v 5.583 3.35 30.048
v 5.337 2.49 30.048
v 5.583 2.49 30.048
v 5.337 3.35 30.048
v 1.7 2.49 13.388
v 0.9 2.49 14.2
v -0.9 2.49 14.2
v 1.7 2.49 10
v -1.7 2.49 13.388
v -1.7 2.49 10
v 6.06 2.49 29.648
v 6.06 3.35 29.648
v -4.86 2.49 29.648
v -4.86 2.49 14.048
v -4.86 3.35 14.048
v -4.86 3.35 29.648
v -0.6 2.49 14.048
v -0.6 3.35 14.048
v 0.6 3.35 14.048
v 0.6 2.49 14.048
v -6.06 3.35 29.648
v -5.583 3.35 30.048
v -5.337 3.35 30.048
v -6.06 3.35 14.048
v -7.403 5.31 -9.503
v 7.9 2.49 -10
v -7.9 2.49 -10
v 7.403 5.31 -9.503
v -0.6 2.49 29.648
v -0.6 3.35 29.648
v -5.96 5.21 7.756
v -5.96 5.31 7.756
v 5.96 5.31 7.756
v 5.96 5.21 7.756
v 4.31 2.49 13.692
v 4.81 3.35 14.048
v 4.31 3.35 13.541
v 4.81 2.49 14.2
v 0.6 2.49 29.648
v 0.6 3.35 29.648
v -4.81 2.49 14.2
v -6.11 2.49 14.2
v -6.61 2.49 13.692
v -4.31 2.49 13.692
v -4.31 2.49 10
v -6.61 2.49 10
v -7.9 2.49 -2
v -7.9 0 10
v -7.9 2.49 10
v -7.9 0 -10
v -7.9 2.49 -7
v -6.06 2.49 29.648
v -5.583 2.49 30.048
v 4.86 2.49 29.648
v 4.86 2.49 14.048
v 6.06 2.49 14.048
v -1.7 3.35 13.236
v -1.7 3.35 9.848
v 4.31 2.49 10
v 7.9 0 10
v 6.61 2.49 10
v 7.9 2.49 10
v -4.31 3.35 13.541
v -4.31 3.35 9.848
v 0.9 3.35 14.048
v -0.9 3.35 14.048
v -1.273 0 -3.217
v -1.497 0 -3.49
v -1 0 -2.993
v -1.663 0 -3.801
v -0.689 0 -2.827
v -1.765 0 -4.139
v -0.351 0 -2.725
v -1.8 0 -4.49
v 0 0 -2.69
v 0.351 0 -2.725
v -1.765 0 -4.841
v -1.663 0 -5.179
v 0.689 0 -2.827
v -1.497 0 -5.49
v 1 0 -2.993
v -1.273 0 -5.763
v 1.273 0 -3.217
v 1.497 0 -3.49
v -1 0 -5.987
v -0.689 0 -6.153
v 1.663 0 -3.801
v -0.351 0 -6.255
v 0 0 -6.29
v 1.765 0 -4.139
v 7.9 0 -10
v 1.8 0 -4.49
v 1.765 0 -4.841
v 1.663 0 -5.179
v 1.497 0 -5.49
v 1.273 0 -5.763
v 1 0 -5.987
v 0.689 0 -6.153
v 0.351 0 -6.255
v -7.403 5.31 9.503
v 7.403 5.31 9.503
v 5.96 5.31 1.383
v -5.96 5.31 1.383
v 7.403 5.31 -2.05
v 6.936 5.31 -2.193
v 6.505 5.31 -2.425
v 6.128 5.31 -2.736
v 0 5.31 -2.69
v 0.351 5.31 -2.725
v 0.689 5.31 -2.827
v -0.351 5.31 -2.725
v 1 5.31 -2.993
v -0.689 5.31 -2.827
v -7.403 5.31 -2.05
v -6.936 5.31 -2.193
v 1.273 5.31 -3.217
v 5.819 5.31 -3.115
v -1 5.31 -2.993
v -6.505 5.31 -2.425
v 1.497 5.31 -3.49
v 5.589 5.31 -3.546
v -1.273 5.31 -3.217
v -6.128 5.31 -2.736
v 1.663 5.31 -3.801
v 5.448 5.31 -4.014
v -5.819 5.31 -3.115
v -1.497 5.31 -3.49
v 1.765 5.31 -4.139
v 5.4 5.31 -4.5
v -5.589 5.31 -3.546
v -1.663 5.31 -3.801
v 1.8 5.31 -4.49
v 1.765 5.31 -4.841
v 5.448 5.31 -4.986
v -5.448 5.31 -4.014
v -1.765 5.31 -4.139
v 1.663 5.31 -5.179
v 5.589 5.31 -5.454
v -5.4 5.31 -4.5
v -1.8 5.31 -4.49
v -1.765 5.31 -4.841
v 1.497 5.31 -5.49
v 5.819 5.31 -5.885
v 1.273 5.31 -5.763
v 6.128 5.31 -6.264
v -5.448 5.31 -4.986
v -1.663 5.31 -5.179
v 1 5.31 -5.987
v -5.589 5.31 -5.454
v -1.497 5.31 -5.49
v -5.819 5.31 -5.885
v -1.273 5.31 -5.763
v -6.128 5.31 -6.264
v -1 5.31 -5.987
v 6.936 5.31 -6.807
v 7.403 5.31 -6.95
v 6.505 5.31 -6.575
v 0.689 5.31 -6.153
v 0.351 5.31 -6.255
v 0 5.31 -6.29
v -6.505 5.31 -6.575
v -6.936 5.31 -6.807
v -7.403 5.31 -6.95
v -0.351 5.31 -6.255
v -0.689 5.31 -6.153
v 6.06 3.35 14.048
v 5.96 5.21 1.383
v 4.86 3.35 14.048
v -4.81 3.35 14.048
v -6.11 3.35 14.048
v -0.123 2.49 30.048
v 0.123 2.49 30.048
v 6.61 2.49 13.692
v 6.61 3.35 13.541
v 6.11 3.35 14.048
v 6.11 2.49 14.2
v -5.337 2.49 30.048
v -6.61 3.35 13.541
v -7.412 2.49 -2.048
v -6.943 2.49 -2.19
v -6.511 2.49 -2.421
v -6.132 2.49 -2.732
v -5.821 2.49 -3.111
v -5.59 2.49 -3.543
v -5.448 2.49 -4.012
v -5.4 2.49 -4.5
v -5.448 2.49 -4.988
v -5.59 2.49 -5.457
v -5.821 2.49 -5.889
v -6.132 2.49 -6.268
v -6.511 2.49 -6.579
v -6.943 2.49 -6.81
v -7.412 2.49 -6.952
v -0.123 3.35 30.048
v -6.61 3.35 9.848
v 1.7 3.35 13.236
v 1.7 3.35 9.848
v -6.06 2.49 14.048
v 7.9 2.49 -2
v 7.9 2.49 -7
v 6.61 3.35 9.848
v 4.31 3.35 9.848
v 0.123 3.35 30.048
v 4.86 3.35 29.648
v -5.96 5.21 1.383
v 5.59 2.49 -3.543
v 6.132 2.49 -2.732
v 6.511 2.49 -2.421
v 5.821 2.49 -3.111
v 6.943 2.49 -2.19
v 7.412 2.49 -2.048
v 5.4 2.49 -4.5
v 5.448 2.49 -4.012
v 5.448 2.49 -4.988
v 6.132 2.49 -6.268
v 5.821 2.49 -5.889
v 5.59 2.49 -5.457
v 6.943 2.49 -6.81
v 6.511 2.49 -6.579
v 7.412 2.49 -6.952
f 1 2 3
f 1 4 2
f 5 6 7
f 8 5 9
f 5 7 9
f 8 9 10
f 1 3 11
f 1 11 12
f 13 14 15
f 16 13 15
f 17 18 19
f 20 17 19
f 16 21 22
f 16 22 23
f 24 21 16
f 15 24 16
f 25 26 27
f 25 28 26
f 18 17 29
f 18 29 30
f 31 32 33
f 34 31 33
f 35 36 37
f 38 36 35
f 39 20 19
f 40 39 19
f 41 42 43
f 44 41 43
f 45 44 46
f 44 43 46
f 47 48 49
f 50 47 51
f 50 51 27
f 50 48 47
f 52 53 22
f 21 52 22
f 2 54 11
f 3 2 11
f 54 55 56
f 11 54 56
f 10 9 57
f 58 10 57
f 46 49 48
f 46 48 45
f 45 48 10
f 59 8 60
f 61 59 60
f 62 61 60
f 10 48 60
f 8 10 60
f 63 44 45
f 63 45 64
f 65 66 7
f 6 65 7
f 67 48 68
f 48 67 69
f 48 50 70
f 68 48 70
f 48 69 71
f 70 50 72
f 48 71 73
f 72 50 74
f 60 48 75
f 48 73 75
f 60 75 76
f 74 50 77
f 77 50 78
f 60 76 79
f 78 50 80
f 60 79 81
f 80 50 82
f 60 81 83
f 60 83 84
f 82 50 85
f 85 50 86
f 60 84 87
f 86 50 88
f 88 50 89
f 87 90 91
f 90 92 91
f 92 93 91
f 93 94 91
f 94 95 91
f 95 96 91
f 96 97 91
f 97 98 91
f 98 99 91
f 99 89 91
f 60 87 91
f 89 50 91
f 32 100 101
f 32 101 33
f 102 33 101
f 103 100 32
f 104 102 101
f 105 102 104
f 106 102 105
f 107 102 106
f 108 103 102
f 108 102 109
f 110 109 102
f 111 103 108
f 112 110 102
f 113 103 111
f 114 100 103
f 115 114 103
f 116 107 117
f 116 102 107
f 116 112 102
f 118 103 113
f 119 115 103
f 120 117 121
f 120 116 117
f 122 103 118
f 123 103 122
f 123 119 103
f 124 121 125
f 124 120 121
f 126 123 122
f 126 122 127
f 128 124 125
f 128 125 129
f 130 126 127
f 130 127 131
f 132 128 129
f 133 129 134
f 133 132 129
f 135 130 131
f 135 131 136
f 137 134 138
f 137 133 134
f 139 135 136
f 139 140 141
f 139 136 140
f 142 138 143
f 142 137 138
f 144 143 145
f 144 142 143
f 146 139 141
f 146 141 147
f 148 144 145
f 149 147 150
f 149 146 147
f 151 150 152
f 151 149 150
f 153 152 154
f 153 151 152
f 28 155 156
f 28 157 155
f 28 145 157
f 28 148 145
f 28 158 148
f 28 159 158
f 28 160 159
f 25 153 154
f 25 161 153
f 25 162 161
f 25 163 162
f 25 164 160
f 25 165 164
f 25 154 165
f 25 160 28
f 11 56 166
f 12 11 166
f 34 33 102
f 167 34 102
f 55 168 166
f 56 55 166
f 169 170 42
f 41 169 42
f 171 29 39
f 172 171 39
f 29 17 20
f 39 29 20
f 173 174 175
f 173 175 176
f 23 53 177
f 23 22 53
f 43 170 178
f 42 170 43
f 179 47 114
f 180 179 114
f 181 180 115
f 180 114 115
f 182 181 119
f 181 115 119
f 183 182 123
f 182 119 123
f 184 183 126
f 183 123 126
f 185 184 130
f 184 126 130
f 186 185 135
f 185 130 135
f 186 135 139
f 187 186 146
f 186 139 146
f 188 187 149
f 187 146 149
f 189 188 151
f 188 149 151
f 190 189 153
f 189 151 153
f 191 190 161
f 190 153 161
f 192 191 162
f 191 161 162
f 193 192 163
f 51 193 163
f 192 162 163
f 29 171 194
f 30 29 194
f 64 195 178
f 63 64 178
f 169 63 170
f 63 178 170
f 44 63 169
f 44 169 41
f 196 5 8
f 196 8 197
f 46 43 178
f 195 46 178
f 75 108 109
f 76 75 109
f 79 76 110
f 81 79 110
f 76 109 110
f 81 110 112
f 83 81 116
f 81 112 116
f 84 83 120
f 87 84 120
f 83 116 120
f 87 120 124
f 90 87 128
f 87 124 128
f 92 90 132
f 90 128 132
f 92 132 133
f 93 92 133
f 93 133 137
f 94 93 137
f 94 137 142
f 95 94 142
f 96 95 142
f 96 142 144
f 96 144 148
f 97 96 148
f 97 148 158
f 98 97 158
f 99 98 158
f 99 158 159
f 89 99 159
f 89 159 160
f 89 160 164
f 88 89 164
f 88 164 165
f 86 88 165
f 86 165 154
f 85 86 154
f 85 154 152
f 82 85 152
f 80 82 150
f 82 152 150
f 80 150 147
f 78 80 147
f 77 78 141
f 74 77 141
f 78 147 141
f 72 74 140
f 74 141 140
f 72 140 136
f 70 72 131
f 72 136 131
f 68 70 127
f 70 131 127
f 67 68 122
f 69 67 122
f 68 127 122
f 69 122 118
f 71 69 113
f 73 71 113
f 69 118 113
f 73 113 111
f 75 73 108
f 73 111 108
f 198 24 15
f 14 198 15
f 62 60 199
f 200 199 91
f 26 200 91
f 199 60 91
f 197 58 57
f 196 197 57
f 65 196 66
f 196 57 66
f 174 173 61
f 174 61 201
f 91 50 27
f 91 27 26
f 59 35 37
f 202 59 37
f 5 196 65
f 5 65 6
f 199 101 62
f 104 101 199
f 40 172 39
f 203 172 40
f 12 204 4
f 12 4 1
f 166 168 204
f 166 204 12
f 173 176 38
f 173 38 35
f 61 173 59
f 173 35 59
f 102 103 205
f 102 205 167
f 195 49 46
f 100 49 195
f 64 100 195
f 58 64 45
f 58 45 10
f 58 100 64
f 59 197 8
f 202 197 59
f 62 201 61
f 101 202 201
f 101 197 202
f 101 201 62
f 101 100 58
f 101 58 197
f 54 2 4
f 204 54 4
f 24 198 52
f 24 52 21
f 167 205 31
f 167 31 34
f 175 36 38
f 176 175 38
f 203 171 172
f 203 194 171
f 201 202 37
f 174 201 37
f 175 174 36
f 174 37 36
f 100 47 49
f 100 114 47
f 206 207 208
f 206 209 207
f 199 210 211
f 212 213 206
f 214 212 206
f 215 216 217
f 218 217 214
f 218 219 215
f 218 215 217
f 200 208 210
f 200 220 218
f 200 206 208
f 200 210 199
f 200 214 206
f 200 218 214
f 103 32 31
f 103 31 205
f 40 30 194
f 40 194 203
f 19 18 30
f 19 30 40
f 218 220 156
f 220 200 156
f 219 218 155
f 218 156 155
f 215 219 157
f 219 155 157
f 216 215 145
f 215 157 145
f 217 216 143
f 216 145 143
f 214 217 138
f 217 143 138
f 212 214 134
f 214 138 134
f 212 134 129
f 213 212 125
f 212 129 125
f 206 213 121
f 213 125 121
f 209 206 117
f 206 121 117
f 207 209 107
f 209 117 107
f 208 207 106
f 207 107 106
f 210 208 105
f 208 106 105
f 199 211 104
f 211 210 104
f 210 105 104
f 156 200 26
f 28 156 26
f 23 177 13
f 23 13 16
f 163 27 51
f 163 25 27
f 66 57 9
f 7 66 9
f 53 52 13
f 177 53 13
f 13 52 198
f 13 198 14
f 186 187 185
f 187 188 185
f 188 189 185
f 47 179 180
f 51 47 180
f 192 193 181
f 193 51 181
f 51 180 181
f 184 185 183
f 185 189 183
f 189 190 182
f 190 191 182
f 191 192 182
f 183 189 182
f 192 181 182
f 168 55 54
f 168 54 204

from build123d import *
from OCP.BRepFilletAPI import BRepFilletAPI_MakeChamfer

# Parameters (mm, degrees)
SKETCH1_W             = 15.8
SKETCH1_H             = 20
BOSS_EXTRUDE1_DEPTH   = 2.49
SKETCH2_W             = 15.8
SKETCH2_H             = 20
BOSS_EXTRUDE3_DEPTH   = 2.82
BOSS_EXTRUDE3_TAPER   = 10
BOSS_EXTRUDE4_START   = -1.7
BOSS_EXTRUDE4_DEPTH   = 3.4
BOSS_EXTRUDE4_START_2 = -6.61
BOSS_EXTRUDE4_2_DEPTH = 2.3
BOSS_EXTRUDE4_START_3 = 4.31
BOSS_EXTRUDE4_3_DEPTH = 2.3
BOSS_EXTRUDE6_START   = 14.04836
SKETCH5_W             = 1.2
SKETCH5_H             = 0.86
BOSS_EXTRUDE6_DEPTH   = 16
BOSS_EXTRUDE6_2_DEPTH = 16
BOSS_EXTRUDE6_3_DEPTH = 16
SKETCH6_R             = 1.8
CUT_EXTRUDE1_DEPTH    = 32.519994294
SKETCH7_R             = 2.5
CUT_EXTRUDE2_DEPTH    = 2.82
CHAMFER2_SIZE         = 0.5
CHAMFER3_SIZE         = 0.8
CHAMFER7_SIZE         = 0.4
CHAMFER7_SIZE2        = 0.476701437
CHAMFER8_SIZE         = 0.4
CHAMFER8_SIZE2        = 0.476701437
CHAMFER9_SIZE         = 0.4
CHAMFER9_SIZE2        = 0.476701437
SKETCH9_W             = 12.986336946
SKETCH9_H             = 15.440559179
CUT_EXTRUDE3_DEPTH    = 2.49
SKETCH10_W            = 12.986336946
SKETCH10_H            = 15.440559179
BOSS_EXTRUDE7_DEPTH   = 2.49
SKETCH13_R            = 1.8
CUT_EXTRUDE4_DEPTH    = 2.49
SKETCH14_W            = 11.919281888
SKETCH14_H            = 6.372610916
CUT_EXTRUDE5_DEPTH    = 0.1


# Read off the part's stored shape, not the designer's step: Boss-Extrude4
with BuildPart() as part:
    # Sketch1 → Boss-Extrude1 (new body)
    with BuildSketch(Plane(origin=(0, 0, 0), x_dir=(1, 0, 0), z_dir=(0, 1, 0))):
        Rectangle(SKETCH1_W, SKETCH1_H)
    extrude(amount=BOSS_EXTRUDE1_DEPTH)

    # Sketch2 → Boss-Extrude3 (add)
    with BuildSketch(Plane(origin=(0, 2.49, 0), x_dir=(1, 0, 0), z_dir=(0, 1, 0))):
        Rectangle(SKETCH2_W, SKETCH2_H)
    extrude(amount=BOSS_EXTRUDE3_DEPTH, taper=BOSS_EXTRUDE3_TAPER)

    # Boss-Extrude4 outline → Boss-Extrude4 (add)
    with BuildSketch(Plane.YZ.offset(BOSS_EXTRUDE4_START)):
        Polygon((2.49, 10), (3.35, 9.848358796), (3.35, 14.048358797), (2.49, 14.2), align=None)
    extrude(amount=BOSS_EXTRUDE4_DEPTH)

    # Boss-Extrude4 2 outline → Boss-Extrude4 2 (add)
    with BuildSketch(Plane.YZ.offset(BOSS_EXTRUDE4_START_2)):
        Polygon((2.49, 10), (3.35, 9.848358796), (3.35, 14.048358797), (2.49, 14.2), align=None)
    extrude(amount=BOSS_EXTRUDE4_2_DEPTH)

    # Boss-Extrude4 3 outline → Boss-Extrude4 3 (add)
    with BuildSketch(Plane.YZ.offset(BOSS_EXTRUDE4_START_3)):
        Polygon((2.49, 10), (3.35, 9.848358796), (3.35, 14.048358797), (2.49, 14.2), align=None)
    extrude(amount=BOSS_EXTRUDE4_3_DEPTH)

    # Sketch6 → Cut-Extrude1 (cut, through all)
    with BuildSketch(Plane(origin=(0, 5.31, 0), x_dir=(1, 0, 0), z_dir=(0, 1, 0))):
        with Locations(Location((0, 4.49, 0), (0, 0, 270))):
            Circle(SKETCH6_R)
    extrude(amount=-CUT_EXTRUDE1_DEPTH, mode=Mode.SUBTRACT)

    # Sketch7 → Cut-Extrude2 (cut)
    with BuildSketch(Plane(origin=(0, 5.31, 0), x_dir=(1, 0, 0), z_dir=(0, 1, 0))):
        with Locations((7.9, 4.5)):
            Circle(SKETCH7_R)
        with Locations((-7.9, 4.5)):
            Circle(SKETCH7_R)
    extrude(amount=-CUT_EXTRUDE2_DEPTH, mode=Mode.SUBTRACT)

    # Chamfer2
    chamfer2_edges = [part.edges().sort_by_distance(p)[0] for p in [
        (4.31, 2.92, 14.124179399),
        (6.61, 2.92, 14.124179399),
        (-4.31, 2.92, 14.124179399),
        (-6.61, 2.92, 14.124179399),
    ]]
    chamfer(chamfer2_edges, length=CHAMFER2_SIZE)

    # Chamfer3
    chamfer3_edges = [part.edges().sort_by_distance(p)[0] for p in [
        (1.7, 2.92, 14.124179399),
        (-1.7, 2.92, 14.124179399),
    ]]
    chamfer(chamfer3_edges, length=CHAMFER3_SIZE)

    # Sketch9 → Cut-Extrude3 (cut)
    with BuildSketch(Plane.XZ):
        with Locations((0, -0.672147613)):
            Rectangle(SKETCH9_W, SKETCH9_H)
    extrude(amount=-CUT_EXTRUDE3_DEPTH, mode=Mode.SUBTRACT)

    # Sketch10 → Boss-Extrude7 (add)
    with BuildSketch(Plane.XZ.offset(-2.49)):
        with Locations((0, -0.672147613)):
            Rectangle(SKETCH10_W, SKETCH10_H)
    extrude(amount=BOSS_EXTRUDE7_DEPTH)

    # Sketch13 → Cut-Extrude4 (cut)
    with BuildSketch(Plane(origin=(0, 2.49, 0), x_dir=(1, 0, 0), z_dir=(0, 1, 0))):
        with Locations(Location((0, 4.49, 0), (0, 0, 270))):
            Circle(SKETCH13_R)
    extrude(amount=-CUT_EXTRUDE4_DEPTH, mode=Mode.SUBTRACT)

    # Sketch14 → Cut-Extrude5 (cut)
    with BuildSketch(Plane(origin=(0, 5.31, 0), x_dir=(1, 0, 0), z_dir=(0, 1, 0))):
        with Locations((0, -4.569573217)):
            Rectangle(SKETCH14_W, SKETCH14_H)
    extrude(amount=-CUT_EXTRUDE5_DEPTH, mode=Mode.SUBTRACT)


with BuildPart() as body_2:
    # Sketch5 → Boss-Extrude6 (new body)
    with BuildSketch(Plane.XY.offset(BOSS_EXTRUDE6_START)):
        with Locations((0, 2.92)):
            Rectangle(SKETCH5_W, SKETCH5_H)
    extrude(amount=BOSS_EXTRUDE6_DEPTH)

    # Chamfer7: one chamfer whose edges measure the first distance from different faces: ONE call of the kernel's chamfer builder (chamfer() names one face for all edges)
    chamfer7_edges_1 = [body_2.edges().sort_by_distance(p)[0] for p in [
        (-0.6, 2.92, 30.04836),
    ]]
    chamfer7_side_1 = [body_2.faces().sort_by_distance(p)[0] for p in [
        (-0.6, 2.92, 22.04836),
    ]]
    chamfer7_edges_2 = [body_2.edges().sort_by_distance(p)[0] for p in [
        (0.6, 2.92, 30.04836),
    ]]
    chamfer7_side_2 = [body_2.faces().sort_by_distance(p)[0] for p in [
        (0.6, 2.92, 22.04836),
    ]]
    chamfer7 = BRepFilletAPI_MakeChamfer(body_2.part.solid().wrapped)
    for e in chamfer7_edges_1:
        chamfer7.Add(CHAMFER7_SIZE, CHAMFER7_SIZE2, e.wrapped, chamfer7_side_1[0].wrapped)  # the first distance lies on this face
    for e in chamfer7_edges_2:
        chamfer7.Add(CHAMFER7_SIZE, CHAMFER7_SIZE2, e.wrapped, chamfer7_side_2[0].wrapped)  # the first distance lies on this face
    add(Compound.cast(chamfer7.Shape()), mode=Mode.REPLACE)


with BuildPart() as body_3:
    # Sketch5 → Boss-Extrude6 2 (new body)
    with BuildSketch(Plane.XY.offset(BOSS_EXTRUDE6_START)):
        with Locations((5.46, 2.92)):
            Rectangle(SKETCH5_W, SKETCH5_H)
    extrude(amount=BOSS_EXTRUDE6_2_DEPTH)

    # Chamfer9: one chamfer whose edges measure the first distance from different faces: ONE call of the kernel's chamfer builder (chamfer() names one face for all edges)
    chamfer9_edges_1 = [body_3.edges().sort_by_distance(p)[0] for p in [
        (4.86, 2.92, 30.04836),
    ]]
    chamfer9_side_1 = [body_3.faces().sort_by_distance(p)[0] for p in [
        (4.86, 2.92, 22.04836),
    ]]
    chamfer9_edges_2 = [body_3.edges().sort_by_distance(p)[0] for p in [
        (6.06, 2.92, 30.04836),
    ]]
    chamfer9_side_2 = [body_3.faces().sort_by_distance(p)[0] for p in [
        (6.06, 2.92, 22.04836),
    ]]
    chamfer9 = BRepFilletAPI_MakeChamfer(body_3.part.solid().wrapped)
    for e in chamfer9_edges_1:
        chamfer9.Add(CHAMFER9_SIZE, CHAMFER9_SIZE2, e.wrapped, chamfer9_side_1[0].wrapped)  # the first distance lies on this face
    for e in chamfer9_edges_2:
        chamfer9.Add(CHAMFER9_SIZE, CHAMFER9_SIZE2, e.wrapped, chamfer9_side_2[0].wrapped)  # the first distance lies on this face
    add(Compound.cast(chamfer9.Shape()), mode=Mode.REPLACE)


with BuildPart() as body_4:
    # Sketch5 → Boss-Extrude6 3 (new body)
    with BuildSketch(Plane.XY.offset(BOSS_EXTRUDE6_START)):
        with Locations((-5.46, 2.92)):
            Rectangle(SKETCH5_W, SKETCH5_H)
    extrude(amount=BOSS_EXTRUDE6_3_DEPTH)

    # Chamfer8: one chamfer whose edges measure the first distance from different faces: ONE call of the kernel's chamfer builder (chamfer() names one face for all edges)
    chamfer8_edges_1 = [body_4.edges().sort_by_distance(p)[0] for p in [
        (-4.86, 2.92, 30.04836),
    ]]
    chamfer8_side_1 = [body_4.faces().sort_by_distance(p)[0] for p in [
        (-4.86, 2.92, 22.04836),
    ]]
    chamfer8_edges_2 = [body_4.edges().sort_by_distance(p)[0] for p in [
        (-6.06, 2.92, 30.04836),
    ]]
    chamfer8_side_2 = [body_4.faces().sort_by_distance(p)[0] for p in [
        (-6.06, 2.92, 22.04836),
    ]]
    chamfer8 = BRepFilletAPI_MakeChamfer(body_4.part.solid().wrapped)
    for e in chamfer8_edges_1:
        chamfer8.Add(CHAMFER8_SIZE, CHAMFER8_SIZE2, e.wrapped, chamfer8_side_1[0].wrapped)  # the first distance lies on this face
    for e in chamfer8_edges_2:
        chamfer8.Add(CHAMFER8_SIZE, CHAMFER8_SIZE2, e.wrapped, chamfer8_side_2[0].wrapped)  # the first distance lies on this face
    add(Compound.cast(chamfer8.Shape()), mode=Mode.REPLACE)


solid = Compound([part.part, body_2.part, body_3.part, body_4.part])
